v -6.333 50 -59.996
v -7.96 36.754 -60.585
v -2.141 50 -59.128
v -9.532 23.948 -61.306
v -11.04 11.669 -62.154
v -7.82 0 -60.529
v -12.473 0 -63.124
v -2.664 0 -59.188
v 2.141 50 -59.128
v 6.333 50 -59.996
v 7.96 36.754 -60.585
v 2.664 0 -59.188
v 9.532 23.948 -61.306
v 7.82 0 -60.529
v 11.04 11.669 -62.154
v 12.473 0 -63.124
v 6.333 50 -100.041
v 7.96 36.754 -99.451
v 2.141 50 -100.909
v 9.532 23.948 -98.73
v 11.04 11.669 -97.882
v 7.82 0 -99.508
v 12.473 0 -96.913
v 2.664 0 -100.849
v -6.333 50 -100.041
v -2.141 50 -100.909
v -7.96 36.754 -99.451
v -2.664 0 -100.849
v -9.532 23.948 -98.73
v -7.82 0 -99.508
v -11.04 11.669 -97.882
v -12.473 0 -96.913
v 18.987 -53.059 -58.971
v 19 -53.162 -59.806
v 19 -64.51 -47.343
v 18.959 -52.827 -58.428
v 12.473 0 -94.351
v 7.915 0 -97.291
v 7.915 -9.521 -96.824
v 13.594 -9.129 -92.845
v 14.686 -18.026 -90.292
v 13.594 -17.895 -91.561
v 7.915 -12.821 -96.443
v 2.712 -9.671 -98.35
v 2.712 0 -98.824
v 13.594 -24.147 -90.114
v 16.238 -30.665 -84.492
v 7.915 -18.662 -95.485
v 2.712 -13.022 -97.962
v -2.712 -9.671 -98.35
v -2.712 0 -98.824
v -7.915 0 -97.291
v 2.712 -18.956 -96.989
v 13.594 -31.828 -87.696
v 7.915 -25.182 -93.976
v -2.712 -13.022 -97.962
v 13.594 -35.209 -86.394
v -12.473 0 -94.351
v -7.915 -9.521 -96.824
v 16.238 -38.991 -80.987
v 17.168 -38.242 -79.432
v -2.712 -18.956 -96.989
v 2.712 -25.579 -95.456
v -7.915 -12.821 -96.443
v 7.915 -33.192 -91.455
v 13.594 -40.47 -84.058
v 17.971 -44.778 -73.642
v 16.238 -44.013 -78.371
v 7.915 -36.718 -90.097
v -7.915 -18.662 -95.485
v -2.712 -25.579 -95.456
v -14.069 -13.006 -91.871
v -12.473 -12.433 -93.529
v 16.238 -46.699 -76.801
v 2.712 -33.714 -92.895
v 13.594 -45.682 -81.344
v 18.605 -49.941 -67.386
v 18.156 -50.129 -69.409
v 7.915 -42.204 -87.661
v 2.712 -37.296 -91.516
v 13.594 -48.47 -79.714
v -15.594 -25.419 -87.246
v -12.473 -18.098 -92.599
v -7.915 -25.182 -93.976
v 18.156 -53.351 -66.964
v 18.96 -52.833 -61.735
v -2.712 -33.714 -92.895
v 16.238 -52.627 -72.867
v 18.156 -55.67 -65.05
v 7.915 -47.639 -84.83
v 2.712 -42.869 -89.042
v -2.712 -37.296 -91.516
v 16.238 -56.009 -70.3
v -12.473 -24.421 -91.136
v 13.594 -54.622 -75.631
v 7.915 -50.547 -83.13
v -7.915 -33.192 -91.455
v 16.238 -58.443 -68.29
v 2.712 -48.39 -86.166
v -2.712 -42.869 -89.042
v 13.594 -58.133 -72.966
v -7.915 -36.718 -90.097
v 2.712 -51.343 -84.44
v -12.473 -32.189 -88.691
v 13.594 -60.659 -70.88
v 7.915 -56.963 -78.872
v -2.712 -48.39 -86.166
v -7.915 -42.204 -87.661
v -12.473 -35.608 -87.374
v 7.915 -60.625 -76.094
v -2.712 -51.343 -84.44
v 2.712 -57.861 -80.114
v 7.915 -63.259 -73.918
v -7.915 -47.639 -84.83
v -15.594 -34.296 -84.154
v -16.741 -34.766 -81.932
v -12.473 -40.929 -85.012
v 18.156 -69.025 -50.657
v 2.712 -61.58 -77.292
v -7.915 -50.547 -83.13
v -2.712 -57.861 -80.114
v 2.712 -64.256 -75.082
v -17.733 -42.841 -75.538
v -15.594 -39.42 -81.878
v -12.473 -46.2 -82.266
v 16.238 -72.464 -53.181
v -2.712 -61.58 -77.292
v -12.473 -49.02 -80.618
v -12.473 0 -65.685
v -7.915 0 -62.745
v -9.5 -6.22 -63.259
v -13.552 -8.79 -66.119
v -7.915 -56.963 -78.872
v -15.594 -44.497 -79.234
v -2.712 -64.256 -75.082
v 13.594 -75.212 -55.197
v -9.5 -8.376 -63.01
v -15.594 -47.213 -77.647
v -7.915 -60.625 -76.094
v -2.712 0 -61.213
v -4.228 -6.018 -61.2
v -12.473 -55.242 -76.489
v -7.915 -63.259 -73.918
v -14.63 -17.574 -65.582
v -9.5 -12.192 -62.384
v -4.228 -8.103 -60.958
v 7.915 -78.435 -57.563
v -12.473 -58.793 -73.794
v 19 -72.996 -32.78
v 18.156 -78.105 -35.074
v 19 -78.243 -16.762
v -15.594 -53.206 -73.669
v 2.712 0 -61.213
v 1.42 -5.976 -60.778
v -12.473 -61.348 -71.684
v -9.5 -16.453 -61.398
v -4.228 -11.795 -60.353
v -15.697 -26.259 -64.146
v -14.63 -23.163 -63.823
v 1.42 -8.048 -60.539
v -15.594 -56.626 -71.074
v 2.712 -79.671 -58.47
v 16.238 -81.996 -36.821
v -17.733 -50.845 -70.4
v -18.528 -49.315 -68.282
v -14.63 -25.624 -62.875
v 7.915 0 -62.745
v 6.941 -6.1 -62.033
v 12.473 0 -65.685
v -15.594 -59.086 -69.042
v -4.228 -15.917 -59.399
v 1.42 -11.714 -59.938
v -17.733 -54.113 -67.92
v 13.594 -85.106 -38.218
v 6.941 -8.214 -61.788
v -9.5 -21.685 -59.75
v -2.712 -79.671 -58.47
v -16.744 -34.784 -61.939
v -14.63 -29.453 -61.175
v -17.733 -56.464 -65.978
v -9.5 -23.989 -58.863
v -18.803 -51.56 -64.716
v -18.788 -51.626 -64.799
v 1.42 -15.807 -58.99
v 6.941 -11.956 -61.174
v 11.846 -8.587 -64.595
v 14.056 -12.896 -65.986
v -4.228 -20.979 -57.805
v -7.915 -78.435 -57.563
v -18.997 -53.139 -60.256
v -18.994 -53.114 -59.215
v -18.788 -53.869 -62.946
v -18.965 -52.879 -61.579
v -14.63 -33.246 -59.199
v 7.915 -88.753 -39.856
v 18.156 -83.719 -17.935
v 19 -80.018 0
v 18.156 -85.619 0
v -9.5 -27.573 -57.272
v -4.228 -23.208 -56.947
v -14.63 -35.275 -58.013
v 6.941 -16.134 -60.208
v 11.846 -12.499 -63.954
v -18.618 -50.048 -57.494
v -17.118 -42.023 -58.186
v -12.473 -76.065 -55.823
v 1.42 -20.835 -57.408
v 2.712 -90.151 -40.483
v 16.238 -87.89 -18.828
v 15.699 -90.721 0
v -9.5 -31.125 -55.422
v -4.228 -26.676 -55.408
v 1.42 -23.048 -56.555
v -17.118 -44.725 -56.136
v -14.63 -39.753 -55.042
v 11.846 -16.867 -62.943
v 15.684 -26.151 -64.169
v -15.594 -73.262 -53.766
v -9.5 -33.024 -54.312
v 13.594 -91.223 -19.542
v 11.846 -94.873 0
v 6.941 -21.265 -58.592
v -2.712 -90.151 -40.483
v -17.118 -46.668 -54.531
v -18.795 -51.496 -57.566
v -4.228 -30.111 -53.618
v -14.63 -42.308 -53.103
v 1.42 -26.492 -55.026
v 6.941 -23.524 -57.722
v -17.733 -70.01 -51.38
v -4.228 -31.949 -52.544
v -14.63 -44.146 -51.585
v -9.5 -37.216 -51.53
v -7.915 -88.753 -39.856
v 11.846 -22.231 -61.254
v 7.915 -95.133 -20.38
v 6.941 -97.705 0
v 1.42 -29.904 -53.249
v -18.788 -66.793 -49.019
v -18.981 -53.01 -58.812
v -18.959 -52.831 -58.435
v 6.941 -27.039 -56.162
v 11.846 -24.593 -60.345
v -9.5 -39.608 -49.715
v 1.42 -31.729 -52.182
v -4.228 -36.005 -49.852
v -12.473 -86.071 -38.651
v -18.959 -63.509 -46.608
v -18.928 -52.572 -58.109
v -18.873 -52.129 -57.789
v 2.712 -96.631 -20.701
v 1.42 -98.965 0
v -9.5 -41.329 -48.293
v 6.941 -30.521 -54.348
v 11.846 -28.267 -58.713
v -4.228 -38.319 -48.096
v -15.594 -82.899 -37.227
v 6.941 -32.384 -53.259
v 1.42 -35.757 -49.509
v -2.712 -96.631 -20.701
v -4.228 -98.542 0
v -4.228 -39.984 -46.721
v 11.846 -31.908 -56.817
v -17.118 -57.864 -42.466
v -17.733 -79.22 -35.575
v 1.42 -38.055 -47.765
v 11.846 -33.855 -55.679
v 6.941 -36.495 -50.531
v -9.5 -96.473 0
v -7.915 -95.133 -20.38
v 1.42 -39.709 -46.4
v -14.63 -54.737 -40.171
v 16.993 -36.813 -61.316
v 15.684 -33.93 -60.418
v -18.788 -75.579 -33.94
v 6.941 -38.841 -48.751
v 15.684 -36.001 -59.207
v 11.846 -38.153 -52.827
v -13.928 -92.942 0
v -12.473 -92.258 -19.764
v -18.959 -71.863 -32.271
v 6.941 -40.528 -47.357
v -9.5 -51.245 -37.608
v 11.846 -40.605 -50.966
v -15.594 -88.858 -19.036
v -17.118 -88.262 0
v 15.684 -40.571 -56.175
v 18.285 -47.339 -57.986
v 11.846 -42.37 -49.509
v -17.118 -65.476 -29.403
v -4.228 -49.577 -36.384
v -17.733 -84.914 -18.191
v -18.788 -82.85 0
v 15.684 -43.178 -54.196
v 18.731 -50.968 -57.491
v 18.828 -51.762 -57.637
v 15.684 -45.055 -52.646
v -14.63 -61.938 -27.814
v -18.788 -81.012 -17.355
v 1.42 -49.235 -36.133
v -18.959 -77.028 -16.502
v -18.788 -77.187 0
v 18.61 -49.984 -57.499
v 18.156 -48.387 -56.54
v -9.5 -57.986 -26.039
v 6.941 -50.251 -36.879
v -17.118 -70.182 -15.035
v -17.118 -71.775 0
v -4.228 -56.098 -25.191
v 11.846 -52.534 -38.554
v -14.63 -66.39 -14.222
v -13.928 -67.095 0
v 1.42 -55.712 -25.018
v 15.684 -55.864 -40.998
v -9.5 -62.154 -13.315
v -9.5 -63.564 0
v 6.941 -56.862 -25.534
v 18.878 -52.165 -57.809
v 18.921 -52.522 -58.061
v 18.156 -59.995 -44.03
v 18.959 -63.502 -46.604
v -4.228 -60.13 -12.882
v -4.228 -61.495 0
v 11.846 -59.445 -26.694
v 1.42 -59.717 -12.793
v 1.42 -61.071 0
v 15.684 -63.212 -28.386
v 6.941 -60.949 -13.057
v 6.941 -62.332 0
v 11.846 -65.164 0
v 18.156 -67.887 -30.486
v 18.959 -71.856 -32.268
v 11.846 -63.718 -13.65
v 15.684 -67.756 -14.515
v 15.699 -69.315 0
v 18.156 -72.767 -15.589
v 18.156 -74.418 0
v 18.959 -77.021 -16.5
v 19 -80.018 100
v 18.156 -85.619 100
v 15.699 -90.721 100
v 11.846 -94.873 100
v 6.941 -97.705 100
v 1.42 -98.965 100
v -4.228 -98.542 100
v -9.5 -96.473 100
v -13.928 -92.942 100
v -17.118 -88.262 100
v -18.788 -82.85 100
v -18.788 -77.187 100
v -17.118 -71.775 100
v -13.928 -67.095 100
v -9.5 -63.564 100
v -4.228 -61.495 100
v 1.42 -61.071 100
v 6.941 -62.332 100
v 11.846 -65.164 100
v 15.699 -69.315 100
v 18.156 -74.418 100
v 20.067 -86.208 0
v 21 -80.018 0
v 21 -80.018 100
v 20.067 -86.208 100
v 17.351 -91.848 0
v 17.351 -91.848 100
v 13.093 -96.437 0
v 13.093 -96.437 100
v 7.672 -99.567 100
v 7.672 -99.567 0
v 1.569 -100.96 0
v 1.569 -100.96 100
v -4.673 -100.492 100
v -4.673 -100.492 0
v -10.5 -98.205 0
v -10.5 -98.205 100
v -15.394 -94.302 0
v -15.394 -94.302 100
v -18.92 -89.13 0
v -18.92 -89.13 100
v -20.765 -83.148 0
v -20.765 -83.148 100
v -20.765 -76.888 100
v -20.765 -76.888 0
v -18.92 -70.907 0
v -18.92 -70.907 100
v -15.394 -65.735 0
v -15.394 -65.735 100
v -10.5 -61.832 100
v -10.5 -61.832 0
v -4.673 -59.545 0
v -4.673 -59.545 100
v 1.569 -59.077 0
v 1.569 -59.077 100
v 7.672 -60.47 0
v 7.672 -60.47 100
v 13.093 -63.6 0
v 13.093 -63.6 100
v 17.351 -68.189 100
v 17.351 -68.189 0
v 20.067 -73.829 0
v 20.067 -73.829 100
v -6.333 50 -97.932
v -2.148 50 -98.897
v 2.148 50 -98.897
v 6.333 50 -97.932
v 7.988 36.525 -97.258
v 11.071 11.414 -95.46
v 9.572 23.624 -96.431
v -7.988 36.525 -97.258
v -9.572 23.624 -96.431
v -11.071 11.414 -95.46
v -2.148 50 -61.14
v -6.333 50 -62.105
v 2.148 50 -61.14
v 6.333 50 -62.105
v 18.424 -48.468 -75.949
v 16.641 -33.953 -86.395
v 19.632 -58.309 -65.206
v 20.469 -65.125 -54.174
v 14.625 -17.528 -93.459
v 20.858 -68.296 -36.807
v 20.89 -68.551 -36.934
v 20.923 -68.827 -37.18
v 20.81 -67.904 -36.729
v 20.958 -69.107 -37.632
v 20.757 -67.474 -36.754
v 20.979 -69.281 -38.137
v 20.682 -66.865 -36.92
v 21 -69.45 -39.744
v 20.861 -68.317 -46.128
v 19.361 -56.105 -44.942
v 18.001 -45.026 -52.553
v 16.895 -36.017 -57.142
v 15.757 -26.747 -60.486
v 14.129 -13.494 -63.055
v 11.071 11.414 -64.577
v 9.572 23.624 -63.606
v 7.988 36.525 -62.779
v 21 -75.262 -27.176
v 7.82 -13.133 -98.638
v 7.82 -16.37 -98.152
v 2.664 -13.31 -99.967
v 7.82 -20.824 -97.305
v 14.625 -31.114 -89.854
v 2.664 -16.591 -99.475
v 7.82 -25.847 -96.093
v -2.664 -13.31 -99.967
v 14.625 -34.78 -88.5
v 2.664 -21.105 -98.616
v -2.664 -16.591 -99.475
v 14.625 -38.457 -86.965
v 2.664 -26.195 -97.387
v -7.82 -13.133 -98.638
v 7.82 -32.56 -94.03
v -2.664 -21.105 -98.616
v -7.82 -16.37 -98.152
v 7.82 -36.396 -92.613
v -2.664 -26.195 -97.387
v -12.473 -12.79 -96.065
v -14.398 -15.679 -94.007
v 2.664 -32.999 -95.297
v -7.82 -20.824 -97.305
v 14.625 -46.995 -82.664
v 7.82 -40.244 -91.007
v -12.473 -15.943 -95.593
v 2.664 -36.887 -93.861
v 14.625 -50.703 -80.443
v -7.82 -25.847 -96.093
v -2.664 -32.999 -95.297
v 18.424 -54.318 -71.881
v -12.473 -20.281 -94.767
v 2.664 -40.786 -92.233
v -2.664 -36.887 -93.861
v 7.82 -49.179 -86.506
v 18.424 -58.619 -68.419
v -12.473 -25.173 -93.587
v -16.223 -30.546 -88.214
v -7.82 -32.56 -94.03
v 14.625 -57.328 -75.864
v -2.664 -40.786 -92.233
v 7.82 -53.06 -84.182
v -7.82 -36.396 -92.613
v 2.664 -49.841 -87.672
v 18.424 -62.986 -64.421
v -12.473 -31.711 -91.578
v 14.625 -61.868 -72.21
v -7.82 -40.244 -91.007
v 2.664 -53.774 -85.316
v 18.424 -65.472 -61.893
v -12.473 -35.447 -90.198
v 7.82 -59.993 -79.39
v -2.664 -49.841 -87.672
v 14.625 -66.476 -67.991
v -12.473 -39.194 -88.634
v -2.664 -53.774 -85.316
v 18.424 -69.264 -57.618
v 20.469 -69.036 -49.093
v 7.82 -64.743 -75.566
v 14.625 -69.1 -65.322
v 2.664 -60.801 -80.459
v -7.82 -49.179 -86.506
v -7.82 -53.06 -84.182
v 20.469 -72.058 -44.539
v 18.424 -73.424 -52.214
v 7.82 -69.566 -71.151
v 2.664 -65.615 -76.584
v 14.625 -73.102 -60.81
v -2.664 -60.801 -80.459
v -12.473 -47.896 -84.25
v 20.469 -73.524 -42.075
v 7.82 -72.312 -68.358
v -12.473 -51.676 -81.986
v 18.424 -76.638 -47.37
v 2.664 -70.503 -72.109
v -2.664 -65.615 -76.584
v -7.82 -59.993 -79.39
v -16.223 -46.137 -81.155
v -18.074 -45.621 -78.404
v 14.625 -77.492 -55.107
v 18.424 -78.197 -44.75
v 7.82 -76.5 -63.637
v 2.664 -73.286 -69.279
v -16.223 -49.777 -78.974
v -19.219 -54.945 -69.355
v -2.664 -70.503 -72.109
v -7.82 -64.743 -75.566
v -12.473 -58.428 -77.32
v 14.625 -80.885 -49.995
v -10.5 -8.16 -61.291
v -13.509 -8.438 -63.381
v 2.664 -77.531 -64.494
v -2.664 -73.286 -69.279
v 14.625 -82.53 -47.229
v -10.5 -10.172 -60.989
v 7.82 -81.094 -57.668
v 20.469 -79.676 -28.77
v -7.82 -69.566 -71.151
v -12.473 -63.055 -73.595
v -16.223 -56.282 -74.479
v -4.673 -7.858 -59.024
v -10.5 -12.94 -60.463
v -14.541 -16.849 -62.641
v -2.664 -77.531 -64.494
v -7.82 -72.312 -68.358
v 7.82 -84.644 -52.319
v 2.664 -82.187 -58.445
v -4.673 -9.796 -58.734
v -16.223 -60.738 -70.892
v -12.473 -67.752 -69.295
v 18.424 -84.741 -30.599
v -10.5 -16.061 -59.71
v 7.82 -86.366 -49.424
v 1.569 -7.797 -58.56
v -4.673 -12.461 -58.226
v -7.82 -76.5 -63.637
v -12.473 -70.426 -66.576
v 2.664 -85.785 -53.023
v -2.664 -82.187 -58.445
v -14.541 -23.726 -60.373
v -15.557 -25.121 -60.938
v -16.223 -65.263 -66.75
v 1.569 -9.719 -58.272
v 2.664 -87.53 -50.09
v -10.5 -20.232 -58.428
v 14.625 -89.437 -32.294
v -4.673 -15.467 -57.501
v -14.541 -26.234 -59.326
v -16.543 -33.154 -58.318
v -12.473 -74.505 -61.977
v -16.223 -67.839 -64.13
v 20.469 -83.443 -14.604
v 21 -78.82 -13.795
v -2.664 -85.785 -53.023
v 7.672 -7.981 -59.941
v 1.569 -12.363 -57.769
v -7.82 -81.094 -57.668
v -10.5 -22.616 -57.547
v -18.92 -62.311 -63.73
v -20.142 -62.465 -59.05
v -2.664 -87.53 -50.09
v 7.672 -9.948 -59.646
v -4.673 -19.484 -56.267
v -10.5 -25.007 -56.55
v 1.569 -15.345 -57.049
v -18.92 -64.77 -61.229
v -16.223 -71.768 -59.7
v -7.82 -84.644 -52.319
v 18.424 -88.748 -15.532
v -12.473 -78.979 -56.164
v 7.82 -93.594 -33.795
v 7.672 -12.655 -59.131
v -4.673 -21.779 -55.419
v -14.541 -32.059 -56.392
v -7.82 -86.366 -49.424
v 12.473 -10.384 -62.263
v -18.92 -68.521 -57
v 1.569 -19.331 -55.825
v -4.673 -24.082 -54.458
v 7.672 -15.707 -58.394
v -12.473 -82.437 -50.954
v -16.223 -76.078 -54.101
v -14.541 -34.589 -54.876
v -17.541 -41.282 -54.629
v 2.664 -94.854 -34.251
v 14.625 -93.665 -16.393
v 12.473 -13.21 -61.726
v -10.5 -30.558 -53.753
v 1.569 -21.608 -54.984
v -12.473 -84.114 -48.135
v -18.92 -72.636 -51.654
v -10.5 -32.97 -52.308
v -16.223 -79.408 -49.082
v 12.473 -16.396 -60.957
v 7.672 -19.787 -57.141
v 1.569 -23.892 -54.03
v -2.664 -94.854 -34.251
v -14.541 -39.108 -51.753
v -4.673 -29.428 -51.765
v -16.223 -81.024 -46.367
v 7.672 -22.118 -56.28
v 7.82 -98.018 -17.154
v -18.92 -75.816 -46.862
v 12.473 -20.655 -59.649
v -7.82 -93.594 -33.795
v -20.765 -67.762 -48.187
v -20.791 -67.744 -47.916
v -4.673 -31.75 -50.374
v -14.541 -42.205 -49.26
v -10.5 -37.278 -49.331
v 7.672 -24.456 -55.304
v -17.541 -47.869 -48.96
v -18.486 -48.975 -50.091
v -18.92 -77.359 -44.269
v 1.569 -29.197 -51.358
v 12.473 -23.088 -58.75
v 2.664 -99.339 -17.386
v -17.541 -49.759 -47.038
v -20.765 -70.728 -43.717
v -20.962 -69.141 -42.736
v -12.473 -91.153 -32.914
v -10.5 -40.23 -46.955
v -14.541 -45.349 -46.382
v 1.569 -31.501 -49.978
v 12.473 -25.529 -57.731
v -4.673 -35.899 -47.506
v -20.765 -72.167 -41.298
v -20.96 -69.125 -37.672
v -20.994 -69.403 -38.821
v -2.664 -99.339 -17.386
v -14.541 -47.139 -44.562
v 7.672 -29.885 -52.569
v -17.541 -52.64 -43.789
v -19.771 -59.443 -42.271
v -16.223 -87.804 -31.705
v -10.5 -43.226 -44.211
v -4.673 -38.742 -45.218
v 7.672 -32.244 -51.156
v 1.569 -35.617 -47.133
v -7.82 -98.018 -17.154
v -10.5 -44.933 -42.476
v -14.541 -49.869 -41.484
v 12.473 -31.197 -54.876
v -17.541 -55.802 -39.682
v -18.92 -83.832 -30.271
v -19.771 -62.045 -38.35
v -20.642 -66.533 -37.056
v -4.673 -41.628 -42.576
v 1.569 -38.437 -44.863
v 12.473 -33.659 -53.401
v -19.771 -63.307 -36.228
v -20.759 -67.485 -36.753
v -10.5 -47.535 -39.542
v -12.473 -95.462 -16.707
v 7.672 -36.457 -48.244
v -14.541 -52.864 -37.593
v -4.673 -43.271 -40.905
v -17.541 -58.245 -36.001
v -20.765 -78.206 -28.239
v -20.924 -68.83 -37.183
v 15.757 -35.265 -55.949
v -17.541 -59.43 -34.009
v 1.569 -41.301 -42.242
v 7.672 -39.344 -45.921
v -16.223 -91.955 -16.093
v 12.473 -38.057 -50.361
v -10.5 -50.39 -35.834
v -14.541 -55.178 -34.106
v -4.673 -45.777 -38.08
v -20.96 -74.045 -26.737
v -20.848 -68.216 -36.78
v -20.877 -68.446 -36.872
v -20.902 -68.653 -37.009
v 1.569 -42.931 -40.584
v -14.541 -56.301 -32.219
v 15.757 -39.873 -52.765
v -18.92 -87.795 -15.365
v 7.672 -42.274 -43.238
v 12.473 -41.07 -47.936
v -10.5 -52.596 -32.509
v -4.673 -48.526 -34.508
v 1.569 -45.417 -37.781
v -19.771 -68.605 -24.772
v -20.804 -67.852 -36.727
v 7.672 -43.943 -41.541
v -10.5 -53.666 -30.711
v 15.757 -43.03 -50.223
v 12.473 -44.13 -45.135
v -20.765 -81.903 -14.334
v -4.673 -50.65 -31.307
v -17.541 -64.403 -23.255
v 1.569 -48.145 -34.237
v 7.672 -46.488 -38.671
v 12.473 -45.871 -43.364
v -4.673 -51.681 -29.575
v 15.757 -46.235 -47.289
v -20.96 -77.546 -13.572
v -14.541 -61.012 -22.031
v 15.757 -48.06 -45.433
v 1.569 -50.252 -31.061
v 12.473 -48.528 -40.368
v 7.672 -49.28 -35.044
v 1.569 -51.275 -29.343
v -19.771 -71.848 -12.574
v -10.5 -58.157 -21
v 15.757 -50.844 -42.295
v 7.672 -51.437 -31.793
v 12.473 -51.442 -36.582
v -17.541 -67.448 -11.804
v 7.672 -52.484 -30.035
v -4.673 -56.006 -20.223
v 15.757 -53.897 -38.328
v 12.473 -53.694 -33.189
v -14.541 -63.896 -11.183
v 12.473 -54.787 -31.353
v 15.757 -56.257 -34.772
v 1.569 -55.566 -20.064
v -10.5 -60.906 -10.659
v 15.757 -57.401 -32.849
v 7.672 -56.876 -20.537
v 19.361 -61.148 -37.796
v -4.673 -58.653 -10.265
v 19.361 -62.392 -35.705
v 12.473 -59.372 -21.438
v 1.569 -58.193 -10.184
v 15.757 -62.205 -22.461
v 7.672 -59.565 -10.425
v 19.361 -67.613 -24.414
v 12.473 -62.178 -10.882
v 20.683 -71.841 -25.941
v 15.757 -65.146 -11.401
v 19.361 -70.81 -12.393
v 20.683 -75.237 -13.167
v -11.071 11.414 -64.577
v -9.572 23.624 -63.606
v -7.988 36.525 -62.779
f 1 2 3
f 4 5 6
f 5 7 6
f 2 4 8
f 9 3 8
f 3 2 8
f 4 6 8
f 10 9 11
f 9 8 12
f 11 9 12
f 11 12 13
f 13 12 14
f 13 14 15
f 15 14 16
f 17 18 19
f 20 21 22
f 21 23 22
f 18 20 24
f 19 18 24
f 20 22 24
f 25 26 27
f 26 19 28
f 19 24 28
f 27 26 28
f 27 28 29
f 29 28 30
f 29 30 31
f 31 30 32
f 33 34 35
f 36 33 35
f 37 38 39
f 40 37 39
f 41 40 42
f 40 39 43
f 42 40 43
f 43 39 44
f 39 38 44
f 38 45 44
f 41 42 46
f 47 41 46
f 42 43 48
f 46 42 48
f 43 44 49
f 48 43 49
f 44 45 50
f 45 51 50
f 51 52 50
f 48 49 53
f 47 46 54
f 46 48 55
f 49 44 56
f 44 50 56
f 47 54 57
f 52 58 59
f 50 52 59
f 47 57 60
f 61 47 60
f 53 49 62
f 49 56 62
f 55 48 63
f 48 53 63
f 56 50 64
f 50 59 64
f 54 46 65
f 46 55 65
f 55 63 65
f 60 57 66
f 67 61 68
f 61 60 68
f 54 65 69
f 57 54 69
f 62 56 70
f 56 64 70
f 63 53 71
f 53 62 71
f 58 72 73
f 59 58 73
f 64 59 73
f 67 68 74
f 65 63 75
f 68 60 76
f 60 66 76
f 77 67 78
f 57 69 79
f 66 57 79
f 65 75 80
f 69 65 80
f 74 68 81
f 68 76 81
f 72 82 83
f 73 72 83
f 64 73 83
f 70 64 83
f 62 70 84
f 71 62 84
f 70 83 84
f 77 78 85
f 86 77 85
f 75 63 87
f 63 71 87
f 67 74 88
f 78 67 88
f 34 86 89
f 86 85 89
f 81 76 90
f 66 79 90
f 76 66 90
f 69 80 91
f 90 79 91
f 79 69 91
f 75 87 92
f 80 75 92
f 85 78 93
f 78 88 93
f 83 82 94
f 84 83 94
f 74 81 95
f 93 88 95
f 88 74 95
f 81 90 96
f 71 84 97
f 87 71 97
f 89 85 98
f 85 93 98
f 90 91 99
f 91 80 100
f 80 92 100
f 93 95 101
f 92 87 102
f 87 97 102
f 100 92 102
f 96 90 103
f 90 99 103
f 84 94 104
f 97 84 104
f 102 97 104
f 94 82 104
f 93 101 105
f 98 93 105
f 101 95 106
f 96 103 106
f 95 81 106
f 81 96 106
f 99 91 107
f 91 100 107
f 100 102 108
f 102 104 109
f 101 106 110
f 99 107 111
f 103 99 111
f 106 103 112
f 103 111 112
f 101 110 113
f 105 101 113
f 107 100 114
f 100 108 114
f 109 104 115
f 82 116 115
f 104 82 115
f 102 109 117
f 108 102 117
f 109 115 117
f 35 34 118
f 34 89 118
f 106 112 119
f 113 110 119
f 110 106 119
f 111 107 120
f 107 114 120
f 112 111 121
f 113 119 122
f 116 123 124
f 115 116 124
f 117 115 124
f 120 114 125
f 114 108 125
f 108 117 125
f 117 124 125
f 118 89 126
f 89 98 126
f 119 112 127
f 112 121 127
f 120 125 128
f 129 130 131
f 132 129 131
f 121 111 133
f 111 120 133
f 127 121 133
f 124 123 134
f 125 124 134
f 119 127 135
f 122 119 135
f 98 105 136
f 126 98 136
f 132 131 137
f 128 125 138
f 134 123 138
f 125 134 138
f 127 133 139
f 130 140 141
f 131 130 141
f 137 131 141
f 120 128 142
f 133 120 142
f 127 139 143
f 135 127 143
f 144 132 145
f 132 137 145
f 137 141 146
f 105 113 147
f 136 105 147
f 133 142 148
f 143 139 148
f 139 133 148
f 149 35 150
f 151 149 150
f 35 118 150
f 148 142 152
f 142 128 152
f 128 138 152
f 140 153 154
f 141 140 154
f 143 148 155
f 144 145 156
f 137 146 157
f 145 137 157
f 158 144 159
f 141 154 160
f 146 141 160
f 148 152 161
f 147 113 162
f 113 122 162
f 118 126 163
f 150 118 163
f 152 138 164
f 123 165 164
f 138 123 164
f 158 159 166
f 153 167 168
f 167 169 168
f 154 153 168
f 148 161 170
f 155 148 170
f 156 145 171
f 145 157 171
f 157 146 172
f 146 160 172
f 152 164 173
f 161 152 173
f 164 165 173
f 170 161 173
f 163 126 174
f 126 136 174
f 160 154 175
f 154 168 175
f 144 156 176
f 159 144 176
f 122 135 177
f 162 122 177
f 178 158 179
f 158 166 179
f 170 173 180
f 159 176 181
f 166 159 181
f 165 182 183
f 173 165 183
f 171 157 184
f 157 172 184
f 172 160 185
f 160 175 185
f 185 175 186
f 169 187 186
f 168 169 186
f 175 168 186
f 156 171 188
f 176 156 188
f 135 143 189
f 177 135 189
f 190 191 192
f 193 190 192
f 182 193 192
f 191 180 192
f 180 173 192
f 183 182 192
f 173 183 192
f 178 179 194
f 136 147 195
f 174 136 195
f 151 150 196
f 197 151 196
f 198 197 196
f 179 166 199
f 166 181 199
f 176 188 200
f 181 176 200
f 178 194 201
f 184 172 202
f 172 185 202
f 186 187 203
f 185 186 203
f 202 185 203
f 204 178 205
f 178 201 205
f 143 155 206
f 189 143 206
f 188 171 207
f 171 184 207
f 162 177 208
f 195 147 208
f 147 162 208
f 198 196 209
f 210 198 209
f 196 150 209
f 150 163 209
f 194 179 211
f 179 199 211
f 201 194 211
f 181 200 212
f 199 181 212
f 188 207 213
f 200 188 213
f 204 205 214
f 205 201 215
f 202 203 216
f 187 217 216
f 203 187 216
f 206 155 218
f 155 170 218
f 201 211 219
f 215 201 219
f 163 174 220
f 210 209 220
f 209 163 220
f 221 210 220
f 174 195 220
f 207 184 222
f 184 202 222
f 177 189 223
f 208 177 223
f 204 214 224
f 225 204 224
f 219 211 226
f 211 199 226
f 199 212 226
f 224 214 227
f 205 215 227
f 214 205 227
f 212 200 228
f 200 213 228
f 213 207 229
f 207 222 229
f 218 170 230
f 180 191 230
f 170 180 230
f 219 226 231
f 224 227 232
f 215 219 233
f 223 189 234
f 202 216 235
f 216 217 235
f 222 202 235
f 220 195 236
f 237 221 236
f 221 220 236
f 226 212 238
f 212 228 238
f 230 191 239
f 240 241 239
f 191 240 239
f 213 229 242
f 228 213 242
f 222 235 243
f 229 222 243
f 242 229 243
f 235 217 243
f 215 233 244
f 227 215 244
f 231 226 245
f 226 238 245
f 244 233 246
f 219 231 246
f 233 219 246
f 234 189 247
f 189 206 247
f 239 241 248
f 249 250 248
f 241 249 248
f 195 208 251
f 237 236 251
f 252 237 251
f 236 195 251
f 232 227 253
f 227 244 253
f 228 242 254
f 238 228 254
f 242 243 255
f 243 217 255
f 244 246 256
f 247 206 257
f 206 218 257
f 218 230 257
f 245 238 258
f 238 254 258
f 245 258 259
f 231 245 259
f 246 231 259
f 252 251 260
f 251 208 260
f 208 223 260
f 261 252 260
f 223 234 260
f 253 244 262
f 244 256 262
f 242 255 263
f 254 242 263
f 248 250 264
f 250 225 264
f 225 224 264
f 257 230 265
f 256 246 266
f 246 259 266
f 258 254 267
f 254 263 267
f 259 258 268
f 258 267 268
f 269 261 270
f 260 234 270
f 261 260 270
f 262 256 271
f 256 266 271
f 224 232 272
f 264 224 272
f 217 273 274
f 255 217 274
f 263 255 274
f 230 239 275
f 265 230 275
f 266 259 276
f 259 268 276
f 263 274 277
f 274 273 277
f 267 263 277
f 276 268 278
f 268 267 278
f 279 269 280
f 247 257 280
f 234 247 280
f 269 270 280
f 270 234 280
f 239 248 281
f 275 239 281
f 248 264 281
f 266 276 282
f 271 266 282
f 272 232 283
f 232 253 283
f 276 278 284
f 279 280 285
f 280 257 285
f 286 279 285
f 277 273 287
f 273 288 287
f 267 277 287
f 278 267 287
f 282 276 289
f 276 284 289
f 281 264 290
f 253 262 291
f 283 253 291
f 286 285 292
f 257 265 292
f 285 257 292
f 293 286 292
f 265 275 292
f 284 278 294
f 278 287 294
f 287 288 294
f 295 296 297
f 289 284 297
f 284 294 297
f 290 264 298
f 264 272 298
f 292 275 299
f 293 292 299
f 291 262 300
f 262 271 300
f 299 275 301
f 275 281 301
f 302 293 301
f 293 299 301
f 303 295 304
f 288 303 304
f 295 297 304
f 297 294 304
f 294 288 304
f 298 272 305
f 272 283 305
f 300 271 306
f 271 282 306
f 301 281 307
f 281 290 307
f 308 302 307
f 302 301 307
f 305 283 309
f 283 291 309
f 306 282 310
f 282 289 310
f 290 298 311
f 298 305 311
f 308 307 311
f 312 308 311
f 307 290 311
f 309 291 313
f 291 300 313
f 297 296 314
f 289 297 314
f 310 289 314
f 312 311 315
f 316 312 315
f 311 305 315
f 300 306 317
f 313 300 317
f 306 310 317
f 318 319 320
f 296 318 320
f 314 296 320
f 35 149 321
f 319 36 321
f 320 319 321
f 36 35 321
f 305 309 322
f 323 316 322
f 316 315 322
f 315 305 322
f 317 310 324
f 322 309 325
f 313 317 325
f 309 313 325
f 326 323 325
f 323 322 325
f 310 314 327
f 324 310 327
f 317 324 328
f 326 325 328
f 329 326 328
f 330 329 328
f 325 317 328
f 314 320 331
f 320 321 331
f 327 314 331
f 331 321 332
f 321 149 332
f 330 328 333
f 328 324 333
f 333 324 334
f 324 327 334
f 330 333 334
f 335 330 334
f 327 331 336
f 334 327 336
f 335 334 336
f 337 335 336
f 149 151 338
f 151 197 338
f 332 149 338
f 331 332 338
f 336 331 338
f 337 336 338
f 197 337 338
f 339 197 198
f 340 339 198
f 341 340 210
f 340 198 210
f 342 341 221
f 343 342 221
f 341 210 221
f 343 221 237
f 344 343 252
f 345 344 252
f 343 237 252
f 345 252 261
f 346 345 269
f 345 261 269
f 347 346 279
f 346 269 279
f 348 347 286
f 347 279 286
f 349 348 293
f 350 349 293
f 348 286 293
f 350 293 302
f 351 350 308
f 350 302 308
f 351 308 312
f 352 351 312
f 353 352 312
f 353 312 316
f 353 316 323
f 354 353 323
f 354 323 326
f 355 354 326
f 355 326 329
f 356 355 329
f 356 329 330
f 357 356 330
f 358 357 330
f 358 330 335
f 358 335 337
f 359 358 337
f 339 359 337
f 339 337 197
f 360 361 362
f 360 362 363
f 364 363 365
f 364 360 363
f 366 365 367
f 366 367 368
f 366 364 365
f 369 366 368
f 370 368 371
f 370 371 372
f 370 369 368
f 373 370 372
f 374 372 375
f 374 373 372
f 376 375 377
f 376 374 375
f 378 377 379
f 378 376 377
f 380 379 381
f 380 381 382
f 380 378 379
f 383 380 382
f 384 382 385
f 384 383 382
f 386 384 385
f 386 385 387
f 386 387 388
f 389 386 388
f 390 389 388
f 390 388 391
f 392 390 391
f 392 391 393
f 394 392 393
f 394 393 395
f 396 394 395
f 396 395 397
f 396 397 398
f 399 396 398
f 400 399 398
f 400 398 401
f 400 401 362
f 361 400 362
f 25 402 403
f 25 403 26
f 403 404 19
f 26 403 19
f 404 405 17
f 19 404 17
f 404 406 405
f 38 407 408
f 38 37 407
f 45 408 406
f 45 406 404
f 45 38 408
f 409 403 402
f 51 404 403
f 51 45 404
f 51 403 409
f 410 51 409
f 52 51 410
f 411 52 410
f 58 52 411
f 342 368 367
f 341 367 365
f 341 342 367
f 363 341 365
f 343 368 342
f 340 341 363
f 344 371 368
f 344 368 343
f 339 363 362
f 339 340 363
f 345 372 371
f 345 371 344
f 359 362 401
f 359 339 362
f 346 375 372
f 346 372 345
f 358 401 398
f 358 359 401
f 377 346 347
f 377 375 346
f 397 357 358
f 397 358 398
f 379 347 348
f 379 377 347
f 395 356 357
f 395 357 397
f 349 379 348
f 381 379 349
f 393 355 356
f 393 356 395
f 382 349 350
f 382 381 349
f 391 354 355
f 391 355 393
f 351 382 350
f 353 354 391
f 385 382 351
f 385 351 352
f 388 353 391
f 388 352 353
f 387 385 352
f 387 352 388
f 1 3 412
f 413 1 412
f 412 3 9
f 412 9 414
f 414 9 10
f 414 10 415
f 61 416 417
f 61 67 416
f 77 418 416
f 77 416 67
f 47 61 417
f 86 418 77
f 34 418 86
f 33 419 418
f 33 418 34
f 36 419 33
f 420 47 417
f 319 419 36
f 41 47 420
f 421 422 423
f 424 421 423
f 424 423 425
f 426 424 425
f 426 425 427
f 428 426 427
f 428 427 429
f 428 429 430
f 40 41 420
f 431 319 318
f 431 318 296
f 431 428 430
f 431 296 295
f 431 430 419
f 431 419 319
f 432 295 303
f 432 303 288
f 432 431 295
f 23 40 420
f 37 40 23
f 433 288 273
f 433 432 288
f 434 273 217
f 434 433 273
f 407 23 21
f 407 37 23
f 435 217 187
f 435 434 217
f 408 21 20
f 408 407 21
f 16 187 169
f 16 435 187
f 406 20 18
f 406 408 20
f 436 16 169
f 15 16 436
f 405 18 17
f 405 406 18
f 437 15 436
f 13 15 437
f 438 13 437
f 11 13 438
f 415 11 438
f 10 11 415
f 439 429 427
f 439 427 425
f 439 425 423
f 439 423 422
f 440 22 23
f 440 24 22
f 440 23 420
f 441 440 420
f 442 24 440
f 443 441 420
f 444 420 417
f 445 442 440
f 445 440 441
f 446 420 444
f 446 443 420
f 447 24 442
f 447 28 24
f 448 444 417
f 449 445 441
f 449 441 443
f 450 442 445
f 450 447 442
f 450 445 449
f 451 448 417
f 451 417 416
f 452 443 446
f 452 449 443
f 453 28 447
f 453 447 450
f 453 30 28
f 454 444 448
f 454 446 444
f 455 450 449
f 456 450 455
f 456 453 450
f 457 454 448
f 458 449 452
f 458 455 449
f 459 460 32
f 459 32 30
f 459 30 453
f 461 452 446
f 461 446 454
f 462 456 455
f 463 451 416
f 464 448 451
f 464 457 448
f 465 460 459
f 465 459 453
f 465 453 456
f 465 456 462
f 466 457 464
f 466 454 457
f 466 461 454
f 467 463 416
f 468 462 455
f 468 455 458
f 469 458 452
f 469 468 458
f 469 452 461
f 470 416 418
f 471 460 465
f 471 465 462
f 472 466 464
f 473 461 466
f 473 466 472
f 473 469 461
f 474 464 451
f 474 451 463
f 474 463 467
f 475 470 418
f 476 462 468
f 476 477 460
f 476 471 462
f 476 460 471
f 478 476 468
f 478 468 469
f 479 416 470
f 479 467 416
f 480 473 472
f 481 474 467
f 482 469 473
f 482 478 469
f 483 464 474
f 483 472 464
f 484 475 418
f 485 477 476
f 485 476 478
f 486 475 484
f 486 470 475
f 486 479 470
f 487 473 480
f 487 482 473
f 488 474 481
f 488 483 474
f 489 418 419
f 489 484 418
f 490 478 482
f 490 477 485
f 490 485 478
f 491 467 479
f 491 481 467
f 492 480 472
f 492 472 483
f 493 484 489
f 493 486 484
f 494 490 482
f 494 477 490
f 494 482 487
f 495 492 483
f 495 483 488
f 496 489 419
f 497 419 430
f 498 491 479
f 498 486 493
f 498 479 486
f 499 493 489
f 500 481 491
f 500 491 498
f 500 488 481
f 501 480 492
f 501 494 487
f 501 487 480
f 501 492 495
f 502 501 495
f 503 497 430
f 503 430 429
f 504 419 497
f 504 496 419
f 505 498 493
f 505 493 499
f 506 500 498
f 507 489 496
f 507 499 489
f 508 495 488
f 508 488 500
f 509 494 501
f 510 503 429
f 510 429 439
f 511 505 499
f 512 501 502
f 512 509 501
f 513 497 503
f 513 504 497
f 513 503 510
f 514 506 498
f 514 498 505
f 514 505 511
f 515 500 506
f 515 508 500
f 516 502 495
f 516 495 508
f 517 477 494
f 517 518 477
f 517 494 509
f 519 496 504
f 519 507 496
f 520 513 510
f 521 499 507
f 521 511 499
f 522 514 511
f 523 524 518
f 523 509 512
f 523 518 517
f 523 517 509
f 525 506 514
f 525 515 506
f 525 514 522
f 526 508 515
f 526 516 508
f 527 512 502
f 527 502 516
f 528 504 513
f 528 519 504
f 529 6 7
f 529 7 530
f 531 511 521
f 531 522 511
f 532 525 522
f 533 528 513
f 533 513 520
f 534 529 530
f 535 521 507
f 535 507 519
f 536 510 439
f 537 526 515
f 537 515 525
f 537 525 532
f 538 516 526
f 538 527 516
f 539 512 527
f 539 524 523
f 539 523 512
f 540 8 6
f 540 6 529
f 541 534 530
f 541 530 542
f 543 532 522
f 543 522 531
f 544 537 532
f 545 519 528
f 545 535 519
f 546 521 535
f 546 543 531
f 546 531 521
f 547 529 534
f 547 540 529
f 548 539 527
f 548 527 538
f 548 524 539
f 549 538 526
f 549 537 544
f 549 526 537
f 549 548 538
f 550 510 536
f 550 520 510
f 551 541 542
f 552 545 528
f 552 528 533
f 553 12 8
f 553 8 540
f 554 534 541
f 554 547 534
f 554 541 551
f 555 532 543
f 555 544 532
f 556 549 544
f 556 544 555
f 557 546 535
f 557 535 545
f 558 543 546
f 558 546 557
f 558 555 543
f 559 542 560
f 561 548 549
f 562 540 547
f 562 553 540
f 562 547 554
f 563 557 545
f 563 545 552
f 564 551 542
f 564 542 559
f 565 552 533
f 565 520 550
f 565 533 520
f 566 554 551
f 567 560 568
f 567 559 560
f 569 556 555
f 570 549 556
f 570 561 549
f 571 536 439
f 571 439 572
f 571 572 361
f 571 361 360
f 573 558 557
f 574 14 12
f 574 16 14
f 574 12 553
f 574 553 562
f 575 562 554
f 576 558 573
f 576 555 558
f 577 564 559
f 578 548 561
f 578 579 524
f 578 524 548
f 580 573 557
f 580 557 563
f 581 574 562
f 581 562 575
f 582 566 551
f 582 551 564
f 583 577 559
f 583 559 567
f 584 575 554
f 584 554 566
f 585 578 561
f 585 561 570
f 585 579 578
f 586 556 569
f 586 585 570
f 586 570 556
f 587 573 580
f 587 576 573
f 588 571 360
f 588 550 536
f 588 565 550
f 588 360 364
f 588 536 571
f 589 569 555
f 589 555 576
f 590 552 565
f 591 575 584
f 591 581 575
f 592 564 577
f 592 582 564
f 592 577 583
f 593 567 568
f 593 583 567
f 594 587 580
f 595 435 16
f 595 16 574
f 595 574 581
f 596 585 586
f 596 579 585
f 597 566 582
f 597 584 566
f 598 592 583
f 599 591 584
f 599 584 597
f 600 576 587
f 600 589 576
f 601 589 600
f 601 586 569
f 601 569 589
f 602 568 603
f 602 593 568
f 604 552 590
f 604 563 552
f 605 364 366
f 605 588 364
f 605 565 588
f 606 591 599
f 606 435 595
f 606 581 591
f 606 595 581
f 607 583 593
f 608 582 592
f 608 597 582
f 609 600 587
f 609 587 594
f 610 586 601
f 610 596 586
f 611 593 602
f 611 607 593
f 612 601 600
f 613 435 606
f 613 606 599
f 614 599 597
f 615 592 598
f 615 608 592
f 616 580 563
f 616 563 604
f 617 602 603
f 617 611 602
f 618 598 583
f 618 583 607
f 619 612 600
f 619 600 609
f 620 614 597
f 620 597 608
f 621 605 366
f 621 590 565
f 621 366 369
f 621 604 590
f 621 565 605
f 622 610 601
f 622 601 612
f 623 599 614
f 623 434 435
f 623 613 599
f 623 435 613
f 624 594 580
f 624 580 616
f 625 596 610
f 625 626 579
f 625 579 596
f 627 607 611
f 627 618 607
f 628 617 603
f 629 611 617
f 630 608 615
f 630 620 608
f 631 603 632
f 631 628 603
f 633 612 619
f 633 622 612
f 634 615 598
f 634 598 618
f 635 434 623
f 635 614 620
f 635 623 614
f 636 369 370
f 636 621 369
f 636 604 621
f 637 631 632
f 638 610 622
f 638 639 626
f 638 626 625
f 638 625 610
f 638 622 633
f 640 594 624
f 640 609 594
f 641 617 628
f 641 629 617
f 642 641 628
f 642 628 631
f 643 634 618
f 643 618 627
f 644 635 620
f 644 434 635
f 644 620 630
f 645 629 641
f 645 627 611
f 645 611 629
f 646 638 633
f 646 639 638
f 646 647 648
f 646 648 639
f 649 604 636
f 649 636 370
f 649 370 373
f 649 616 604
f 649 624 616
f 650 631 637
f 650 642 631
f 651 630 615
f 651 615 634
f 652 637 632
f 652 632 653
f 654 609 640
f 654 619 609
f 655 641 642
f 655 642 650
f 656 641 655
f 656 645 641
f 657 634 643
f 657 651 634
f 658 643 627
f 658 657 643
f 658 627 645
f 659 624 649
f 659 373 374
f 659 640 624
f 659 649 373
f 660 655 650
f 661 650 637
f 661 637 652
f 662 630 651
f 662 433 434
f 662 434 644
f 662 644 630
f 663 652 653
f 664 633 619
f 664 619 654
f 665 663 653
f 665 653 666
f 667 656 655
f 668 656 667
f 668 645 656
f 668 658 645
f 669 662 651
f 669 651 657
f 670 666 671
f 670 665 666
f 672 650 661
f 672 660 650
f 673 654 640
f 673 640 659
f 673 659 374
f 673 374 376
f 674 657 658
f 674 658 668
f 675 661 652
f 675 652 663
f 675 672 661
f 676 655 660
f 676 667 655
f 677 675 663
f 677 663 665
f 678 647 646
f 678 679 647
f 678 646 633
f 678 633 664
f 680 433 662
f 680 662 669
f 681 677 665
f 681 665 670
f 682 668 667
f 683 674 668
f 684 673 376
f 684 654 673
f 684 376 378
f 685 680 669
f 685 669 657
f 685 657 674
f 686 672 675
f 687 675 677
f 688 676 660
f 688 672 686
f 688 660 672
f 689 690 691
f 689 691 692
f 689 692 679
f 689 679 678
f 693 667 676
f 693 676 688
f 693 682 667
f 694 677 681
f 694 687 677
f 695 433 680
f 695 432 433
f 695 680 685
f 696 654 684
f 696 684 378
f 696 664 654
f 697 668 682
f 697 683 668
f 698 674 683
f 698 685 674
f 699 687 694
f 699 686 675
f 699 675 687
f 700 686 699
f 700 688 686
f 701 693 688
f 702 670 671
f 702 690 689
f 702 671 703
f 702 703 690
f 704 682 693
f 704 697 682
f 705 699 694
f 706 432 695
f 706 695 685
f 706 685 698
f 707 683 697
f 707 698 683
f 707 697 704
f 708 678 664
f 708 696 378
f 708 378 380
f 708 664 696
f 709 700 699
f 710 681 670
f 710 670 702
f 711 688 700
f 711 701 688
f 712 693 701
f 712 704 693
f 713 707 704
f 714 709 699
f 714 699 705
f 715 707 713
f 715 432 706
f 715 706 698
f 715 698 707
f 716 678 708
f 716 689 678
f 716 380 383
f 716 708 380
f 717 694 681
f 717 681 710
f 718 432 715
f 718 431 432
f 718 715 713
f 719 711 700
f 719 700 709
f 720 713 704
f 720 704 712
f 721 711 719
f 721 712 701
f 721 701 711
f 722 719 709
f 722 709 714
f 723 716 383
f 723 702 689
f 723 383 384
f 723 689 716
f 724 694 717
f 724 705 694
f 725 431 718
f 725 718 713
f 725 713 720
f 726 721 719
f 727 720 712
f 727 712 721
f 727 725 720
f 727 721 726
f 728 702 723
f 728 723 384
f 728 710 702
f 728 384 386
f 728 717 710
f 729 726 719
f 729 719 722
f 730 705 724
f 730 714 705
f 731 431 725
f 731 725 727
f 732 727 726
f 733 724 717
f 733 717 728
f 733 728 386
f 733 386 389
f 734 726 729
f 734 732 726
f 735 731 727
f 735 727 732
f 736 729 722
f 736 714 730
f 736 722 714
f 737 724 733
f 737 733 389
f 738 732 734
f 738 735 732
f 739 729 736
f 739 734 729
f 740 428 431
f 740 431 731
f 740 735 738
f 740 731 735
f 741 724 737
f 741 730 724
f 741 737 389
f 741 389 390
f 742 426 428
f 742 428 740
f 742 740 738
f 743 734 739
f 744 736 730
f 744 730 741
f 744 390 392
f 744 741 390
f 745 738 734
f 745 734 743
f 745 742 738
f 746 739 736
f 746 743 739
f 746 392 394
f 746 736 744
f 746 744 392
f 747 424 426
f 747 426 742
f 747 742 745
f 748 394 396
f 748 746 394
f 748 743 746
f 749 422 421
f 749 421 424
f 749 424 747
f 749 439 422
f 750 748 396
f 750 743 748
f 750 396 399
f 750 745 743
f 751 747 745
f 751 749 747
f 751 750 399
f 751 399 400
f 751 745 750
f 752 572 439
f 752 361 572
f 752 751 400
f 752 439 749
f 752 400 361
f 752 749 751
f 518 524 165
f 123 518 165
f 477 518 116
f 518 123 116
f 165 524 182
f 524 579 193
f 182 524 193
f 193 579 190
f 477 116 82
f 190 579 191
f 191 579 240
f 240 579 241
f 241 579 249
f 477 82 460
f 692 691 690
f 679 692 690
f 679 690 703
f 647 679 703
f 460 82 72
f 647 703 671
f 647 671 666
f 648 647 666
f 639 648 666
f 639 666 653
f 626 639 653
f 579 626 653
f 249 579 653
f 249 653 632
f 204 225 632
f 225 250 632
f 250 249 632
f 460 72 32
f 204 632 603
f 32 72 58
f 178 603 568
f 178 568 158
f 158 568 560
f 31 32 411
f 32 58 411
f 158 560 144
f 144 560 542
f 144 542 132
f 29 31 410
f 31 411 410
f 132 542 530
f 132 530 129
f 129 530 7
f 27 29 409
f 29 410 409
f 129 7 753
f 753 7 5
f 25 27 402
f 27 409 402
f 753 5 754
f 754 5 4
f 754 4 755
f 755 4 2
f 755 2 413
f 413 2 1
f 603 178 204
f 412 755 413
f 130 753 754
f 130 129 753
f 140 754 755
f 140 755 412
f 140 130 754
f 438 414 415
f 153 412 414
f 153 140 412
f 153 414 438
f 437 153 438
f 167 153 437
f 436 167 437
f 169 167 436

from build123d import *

# Parameters (mm, degrees)
F1_R     = 21
F1_R_2   = 19
F3_DEPTH = 100
F4_DEPTH = 50
F7_DEPTH = 100


with BuildPart() as f2:
    # F2: sweep along a path in F0
    with BuildLine(Plane.YZ) as f2_path:
        ThreePointArc((0, -80), (-56.5685424949, -56.5685424949), (-80, 0))
    # F1 (on Top) → F2 (sweep)
    with BuildSketch(Plane.XY):
        with Locations((0, -80.018363893)):
            Circle(F1_R)
        with Locations((0, -80.018363893)):
            Circle(F1_R_2, mode=Mode.SUBTRACT)
    sweep(path=f2_path.line)

    # F3 (add): a face of the model
    f3_faces = [f2.faces().sort_by_distance(p)[0] for p in [
        (-20.4060303038, -80.018363893, 0),
    ]]
    extrude(f3_faces, amount=F3_DEPTH)

    # F4 (add): a face of the model
    f4_faces = [f2.faces().sort_by_distance(p)[0] for p in [
        (-20.4060303038, 0, -80.018363893),
    ]]
    extrude(f4_faces, amount=F4_DEPTH)


with BuildPart() as f7:
    # F6 (on face) → F7 (new body, symmetric)
    with BuildSketch(Plane.XY.offset(-80.018363893)):
        Polygon((-30.8902455139, -150), (-6.3333333333, 50), (-19, 50), (-50, 50), (-50, -150), align=None)
    extrude(amount=F7_DEPTH, both=True)


with BuildPart() as f8_1:
    # F8: instance of F7
    add(f7.part.mirror(Plane.YZ))


with BuildPart() as f2_1:
    add(f2.part)

    # F9: cut F8_1, F7
    add(f8_1.part, mode=Mode.SUBTRACT)
    add(f7.part, mode=Mode.SUBTRACT)


solid = f2_1.part
